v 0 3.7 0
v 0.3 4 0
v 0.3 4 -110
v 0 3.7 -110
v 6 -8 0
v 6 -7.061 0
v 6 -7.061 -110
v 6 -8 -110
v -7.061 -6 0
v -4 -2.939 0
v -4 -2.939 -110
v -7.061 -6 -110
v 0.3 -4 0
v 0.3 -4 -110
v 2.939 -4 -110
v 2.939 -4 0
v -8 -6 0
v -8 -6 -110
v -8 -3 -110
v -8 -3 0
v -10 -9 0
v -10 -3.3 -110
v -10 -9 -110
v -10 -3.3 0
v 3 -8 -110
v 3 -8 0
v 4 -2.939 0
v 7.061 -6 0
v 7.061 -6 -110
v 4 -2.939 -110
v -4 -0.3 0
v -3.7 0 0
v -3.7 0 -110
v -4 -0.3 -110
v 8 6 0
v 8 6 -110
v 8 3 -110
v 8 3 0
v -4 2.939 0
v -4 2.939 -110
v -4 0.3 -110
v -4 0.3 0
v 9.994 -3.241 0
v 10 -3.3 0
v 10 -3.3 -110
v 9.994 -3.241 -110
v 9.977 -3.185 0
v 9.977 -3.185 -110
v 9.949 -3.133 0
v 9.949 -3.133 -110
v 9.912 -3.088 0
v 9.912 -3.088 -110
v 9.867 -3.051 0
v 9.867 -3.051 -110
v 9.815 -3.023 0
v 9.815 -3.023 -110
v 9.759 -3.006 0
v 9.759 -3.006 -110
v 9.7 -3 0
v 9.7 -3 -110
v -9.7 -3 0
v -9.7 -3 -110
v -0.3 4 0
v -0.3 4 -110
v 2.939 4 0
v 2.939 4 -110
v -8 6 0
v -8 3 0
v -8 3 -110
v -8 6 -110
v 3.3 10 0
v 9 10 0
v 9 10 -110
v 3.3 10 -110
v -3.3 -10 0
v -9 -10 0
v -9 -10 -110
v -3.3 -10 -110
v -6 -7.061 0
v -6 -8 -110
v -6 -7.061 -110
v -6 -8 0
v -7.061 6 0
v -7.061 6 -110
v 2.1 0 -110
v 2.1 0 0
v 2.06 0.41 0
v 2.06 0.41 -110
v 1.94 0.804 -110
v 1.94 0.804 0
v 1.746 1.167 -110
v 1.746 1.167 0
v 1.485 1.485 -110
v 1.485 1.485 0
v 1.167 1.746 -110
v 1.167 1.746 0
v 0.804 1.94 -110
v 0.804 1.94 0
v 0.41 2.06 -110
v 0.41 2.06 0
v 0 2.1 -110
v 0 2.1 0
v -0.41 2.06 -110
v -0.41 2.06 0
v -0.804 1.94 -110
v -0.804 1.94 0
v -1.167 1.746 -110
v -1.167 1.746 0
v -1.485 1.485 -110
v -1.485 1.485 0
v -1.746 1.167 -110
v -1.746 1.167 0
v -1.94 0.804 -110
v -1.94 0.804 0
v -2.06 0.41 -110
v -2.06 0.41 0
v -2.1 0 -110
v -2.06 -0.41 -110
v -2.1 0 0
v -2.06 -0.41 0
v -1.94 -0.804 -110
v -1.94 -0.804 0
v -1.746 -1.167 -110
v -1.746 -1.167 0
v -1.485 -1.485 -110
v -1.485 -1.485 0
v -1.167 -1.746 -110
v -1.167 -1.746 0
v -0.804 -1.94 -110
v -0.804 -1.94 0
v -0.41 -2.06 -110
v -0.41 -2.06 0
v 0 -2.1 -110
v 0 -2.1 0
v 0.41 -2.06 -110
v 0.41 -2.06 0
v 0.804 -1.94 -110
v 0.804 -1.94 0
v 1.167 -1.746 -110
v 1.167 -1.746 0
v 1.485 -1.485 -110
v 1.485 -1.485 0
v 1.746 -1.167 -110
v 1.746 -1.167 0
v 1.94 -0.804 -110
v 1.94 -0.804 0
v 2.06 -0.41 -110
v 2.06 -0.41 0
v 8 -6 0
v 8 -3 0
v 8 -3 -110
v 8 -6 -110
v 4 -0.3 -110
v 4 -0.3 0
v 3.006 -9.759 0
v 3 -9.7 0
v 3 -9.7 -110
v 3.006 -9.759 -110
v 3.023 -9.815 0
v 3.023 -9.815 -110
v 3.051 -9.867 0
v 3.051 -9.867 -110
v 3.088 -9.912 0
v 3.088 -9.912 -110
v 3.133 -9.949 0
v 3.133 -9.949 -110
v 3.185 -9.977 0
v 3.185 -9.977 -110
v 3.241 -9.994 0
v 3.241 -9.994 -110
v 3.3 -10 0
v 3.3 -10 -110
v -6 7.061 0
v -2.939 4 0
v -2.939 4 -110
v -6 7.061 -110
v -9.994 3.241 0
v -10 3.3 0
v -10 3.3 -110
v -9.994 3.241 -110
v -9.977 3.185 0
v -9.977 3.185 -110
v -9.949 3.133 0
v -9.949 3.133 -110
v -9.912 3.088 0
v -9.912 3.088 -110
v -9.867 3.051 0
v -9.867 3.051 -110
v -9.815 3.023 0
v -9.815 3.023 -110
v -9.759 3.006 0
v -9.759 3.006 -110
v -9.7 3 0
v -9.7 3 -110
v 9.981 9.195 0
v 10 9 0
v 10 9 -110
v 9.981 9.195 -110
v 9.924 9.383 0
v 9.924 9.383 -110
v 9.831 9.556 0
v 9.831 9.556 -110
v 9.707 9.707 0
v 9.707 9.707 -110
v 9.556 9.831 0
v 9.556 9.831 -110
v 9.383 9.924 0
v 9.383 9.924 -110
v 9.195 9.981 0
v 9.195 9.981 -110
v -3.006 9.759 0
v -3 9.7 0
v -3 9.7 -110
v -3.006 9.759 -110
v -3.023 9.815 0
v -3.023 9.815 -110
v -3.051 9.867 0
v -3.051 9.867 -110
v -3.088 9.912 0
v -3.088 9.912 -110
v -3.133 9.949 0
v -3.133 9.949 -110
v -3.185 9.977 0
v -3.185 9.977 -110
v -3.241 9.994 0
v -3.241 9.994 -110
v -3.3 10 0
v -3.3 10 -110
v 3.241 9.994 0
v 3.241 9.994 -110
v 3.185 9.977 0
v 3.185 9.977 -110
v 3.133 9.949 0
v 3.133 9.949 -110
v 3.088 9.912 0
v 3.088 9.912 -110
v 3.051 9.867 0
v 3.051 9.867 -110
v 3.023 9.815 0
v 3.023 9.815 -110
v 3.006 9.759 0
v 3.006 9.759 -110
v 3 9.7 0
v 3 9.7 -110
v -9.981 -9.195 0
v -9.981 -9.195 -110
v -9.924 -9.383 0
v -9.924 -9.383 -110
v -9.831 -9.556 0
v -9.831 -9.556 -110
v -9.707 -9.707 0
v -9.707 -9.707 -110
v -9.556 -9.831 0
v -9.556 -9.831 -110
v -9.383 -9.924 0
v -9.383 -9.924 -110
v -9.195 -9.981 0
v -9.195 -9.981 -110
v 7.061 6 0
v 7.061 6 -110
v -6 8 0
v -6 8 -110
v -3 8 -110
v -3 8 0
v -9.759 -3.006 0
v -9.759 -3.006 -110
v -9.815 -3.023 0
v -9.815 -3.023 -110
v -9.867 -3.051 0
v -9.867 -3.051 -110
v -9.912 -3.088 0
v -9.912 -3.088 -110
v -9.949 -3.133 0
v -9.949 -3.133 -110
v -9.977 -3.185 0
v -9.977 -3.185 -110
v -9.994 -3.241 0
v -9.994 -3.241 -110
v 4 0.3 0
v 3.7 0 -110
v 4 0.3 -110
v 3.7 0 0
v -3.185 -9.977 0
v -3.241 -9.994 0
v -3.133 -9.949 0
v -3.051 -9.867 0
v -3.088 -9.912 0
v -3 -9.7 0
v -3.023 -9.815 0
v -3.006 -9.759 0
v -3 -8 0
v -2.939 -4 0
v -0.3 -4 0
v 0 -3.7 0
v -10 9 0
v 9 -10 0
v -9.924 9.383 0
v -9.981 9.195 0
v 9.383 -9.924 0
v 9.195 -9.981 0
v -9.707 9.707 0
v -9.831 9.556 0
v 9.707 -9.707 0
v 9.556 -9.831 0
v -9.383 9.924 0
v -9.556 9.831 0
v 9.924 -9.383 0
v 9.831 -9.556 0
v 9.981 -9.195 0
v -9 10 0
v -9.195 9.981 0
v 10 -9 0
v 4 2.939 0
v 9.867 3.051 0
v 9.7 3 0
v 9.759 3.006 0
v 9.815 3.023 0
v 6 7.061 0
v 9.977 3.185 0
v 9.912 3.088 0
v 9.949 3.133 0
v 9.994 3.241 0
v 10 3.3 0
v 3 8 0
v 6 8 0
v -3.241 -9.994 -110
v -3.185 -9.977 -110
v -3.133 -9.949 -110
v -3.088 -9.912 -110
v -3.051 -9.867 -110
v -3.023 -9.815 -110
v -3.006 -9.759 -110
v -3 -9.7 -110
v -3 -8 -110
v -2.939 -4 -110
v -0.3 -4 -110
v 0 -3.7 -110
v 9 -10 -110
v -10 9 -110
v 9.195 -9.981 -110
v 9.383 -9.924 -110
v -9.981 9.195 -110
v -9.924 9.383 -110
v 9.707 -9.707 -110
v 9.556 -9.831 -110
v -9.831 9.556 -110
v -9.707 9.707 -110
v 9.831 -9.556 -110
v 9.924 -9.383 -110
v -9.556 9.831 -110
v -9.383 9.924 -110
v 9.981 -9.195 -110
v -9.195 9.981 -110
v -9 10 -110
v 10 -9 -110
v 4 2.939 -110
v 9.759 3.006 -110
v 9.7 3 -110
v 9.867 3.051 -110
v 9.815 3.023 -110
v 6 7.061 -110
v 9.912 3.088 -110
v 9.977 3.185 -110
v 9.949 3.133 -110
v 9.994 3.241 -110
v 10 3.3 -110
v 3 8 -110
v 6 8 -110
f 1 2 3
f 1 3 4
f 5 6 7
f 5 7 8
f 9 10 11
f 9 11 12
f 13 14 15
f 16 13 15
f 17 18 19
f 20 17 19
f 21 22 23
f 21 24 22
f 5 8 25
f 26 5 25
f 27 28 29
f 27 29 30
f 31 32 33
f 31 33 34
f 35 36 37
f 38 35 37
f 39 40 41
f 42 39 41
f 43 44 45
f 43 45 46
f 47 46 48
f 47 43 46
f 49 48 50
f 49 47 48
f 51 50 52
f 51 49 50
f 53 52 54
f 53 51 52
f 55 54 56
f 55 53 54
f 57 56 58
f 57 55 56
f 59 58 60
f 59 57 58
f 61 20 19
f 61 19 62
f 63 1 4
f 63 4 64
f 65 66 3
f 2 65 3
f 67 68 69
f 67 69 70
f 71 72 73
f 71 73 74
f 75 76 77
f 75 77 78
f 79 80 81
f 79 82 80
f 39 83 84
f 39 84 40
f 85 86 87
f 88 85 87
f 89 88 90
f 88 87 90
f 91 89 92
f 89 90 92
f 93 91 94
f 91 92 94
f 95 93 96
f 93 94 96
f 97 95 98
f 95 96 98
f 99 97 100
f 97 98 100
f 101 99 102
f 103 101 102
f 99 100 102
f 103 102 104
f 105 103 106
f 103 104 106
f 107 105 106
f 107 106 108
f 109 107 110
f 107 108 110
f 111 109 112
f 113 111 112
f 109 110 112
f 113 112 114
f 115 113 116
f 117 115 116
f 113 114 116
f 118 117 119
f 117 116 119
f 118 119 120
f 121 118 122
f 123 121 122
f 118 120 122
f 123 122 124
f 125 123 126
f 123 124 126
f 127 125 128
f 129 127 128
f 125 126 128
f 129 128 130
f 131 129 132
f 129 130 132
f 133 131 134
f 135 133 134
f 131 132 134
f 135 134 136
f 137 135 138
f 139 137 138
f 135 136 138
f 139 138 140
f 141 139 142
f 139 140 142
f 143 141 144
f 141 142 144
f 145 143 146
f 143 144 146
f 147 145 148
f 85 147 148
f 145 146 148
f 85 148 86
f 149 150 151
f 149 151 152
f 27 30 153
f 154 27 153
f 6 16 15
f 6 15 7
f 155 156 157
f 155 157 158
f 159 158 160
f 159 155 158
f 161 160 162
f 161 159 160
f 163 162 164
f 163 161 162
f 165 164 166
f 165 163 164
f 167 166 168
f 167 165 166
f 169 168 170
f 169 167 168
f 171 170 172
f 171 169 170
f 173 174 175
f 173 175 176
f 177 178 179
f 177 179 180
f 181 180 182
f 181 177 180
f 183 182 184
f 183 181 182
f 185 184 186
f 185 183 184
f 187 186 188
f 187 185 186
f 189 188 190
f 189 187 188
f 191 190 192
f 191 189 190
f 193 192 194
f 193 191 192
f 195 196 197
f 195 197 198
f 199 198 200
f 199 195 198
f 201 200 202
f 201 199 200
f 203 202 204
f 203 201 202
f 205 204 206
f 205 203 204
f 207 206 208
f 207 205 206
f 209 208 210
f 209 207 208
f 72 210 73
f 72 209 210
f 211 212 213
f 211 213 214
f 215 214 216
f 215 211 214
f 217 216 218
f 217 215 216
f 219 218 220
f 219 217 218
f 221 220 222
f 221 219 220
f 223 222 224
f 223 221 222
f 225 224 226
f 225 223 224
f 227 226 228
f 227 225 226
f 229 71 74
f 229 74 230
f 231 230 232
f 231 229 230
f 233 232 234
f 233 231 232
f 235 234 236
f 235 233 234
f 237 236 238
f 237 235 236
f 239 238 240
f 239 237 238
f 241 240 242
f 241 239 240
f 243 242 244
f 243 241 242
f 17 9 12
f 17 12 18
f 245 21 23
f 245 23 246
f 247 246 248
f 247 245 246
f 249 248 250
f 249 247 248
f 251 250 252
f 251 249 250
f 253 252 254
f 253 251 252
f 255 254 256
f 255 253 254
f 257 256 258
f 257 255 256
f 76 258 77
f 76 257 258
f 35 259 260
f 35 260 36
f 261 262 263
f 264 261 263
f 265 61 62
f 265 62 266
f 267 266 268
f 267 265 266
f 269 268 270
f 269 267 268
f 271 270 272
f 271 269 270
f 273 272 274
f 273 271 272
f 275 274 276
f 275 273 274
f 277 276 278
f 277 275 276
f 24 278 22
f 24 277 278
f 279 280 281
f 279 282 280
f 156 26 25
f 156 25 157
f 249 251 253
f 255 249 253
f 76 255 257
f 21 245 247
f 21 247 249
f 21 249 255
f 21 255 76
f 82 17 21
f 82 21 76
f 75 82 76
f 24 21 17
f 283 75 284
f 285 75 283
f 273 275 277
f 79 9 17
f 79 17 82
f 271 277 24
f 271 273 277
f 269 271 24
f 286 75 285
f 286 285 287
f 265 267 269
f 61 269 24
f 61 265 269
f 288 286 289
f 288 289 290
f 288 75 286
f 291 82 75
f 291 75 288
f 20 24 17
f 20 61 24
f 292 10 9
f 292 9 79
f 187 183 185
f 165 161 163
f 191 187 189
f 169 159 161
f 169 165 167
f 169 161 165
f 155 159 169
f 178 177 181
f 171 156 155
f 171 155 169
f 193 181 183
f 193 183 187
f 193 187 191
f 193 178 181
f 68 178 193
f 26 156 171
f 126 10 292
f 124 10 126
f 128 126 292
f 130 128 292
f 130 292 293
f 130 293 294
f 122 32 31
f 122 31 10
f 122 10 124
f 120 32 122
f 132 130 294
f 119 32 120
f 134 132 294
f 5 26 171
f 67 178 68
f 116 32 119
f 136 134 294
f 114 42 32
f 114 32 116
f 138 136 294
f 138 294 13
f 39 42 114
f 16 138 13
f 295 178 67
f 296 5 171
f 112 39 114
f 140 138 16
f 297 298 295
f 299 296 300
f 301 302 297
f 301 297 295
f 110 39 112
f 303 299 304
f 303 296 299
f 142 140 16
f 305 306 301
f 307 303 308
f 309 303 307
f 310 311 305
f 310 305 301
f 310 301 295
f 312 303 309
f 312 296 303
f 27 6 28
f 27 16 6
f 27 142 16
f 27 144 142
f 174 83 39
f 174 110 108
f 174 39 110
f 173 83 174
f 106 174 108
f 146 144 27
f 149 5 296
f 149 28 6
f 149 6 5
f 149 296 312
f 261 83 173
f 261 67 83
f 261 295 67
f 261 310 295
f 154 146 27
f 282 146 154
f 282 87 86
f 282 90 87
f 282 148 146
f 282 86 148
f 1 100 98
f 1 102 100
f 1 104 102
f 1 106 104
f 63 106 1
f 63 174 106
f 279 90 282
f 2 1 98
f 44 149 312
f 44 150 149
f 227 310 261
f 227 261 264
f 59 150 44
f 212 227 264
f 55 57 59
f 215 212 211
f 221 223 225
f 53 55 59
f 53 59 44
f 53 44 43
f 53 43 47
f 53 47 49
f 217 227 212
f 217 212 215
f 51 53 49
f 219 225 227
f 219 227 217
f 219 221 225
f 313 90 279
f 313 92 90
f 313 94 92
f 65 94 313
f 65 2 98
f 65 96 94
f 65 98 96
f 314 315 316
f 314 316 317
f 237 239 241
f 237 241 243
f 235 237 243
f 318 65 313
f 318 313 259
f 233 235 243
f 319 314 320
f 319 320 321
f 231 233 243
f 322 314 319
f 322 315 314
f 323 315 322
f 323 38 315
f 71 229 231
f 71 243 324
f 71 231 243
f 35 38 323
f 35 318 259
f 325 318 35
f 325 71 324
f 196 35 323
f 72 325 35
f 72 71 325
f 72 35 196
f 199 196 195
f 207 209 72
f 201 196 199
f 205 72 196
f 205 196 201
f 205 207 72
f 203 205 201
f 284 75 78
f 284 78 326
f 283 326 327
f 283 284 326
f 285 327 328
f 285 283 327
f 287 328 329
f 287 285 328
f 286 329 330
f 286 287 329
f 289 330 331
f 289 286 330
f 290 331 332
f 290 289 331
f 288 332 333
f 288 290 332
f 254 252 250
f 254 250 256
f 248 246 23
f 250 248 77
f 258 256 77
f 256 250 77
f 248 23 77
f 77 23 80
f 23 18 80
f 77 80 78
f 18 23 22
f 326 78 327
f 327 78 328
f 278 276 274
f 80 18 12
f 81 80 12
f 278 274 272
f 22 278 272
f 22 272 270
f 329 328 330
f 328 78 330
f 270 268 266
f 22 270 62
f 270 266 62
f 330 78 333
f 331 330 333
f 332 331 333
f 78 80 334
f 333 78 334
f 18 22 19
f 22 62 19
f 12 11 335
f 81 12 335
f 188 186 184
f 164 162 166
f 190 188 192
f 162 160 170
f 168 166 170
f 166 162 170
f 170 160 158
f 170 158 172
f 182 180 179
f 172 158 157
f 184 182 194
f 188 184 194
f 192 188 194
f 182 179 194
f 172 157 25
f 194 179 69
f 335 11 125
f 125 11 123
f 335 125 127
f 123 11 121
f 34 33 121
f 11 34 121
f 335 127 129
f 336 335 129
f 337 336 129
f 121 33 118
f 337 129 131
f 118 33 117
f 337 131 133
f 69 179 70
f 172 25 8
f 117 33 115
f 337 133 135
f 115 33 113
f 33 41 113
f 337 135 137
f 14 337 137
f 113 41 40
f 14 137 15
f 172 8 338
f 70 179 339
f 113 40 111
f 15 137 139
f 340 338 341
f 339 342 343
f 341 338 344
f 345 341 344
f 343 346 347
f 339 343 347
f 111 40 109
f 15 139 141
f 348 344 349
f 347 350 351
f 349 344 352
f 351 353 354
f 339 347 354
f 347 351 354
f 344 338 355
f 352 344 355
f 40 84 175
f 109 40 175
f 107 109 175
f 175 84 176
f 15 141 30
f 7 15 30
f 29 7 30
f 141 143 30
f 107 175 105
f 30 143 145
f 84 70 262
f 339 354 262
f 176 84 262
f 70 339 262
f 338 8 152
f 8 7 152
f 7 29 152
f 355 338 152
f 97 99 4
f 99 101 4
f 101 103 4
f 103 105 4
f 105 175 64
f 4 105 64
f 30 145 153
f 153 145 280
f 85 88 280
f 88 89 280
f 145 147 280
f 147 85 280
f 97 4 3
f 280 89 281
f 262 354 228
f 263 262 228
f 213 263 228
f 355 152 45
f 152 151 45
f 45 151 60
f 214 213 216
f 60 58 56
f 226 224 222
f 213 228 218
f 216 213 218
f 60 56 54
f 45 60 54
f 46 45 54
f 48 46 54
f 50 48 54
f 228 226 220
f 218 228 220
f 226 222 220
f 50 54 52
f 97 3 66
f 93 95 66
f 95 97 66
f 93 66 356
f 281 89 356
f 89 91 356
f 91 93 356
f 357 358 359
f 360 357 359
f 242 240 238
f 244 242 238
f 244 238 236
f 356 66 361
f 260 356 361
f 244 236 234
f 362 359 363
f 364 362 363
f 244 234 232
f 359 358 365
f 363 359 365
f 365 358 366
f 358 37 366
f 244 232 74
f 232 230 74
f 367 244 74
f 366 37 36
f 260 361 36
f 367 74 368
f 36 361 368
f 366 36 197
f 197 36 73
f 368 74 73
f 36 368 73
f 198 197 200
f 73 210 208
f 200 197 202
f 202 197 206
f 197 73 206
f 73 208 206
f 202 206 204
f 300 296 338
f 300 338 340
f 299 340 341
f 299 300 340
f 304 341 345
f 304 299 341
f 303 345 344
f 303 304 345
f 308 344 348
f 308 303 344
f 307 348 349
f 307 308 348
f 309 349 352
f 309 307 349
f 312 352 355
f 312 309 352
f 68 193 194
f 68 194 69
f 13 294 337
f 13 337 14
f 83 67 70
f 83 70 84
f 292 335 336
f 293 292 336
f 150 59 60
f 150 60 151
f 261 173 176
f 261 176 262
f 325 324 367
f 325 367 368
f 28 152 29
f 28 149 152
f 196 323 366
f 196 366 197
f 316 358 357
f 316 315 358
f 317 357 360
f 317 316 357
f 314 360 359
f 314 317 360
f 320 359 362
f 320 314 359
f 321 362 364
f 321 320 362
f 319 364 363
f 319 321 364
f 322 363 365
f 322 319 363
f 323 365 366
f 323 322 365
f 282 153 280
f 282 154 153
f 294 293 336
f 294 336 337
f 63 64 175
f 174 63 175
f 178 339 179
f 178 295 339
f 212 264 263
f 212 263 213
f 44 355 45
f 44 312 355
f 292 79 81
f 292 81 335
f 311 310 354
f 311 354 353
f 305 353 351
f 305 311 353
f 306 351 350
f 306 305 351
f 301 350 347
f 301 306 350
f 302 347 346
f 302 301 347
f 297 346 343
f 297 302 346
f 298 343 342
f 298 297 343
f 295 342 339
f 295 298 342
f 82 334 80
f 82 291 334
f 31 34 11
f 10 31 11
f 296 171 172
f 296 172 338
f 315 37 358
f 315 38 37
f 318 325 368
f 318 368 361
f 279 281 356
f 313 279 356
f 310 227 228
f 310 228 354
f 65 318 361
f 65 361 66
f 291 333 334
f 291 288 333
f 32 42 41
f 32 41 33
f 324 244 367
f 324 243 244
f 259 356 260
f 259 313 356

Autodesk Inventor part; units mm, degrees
sketch "Sketch_5" plane through (0, 0, 0) normal (0, 0, 1) x (1, 0, 0)
  arc A0 (-10, 3.3) -> (-9.7, 3) centre (-9.7, 3.3) ccw
  line L0 (-9.7, 3) -> (-8, 3)
  line L1 (-8, 3) -> (-8, 6)
  line L2 (-8, 6) -> (-7.0607, 6)
  line L3 (-7.0607, 6) -> (-4, 2.9393)
  line L4 (-4, 2.9393) -> (-4, 0.3)
  line L5 (-4, 0.3) -> (-3.7, 0)
  line L6 (-3.7, 0) -> (-4, -0.3)
  line L7 (-4, -0.3) -> (-4, -2.9393)
  line L8 (-4, -2.9393) -> (-7.0607, -6)
  line L9 (-7.0607, -6) -> (-8, -6)
  line L10 (-8, -6) -> (-8, -3)
  line L11 (-8, -3) -> (-9.7, -3)
  arc A1 (-9.7, -3) -> (-10, -3.3) centre (-9.7, -3.3) ccw
  line L12 (-10, -3.3) -> (-10, -9)
  arc A2 (-10, -9) -> (-9, -10) centre (-9, -9) ccw
  line L13 (-9, -10) -> (-3.3, -10)
  arc A3 (-3.3, -10) -> (-3, -9.7) centre (-3.3, -9.7) ccw
  line L14 (-3, -9.7) -> (-3, -8)
  line L15 (-3, -8) -> (-6, -8)
  line L16 (-6, -8) -> (-6, -7.0607)
  line L17 (-6, -7.0607) -> (-2.9393, -4)
  line L18 (-2.9393, -4) -> (-0.3, -4)
  line L19 (-0.3, -4) -> (0, -3.7)
  line L20 (0, -3.7) -> (0.3, -4)
  line L21 (0.3, -4) -> (2.9393, -4)
  line L22 (2.9393, -4) -> (6, -7.0607)
  line L23 (6, -7.0607) -> (6, -8)
  line L24 (6, -8) -> (3, -8)
  line L25 (3, -8) -> (3, -9.7)
  arc A4 (3, -9.7) -> (3.3, -10) centre (3.3, -9.7) ccw
  line L26 (3.3, -10) -> (9, -10)
  arc A5 (9, -10) -> (10, -9) centre (9, -9) ccw
  line L27 (10, -9) -> (10, -3.3)
  arc A6 (10, -3.3) -> (9.7, -3) centre (9.7, -3.3) ccw
  line L28 (9.7, -3) -> (8, -3)
  line L29 (8, -3) -> (8, -6)
  line L30 (8, -6) -> (7.0607, -6)
  line L31 (7.0607, -6) -> (4, -2.9393)
  line L32 (4, -2.9393) -> (4, -0.3)
  line L33 (4, -0.3) -> (3.7, 0)
  line L34 (3.7, 0) -> (4, 0.3)
  line L35 (4, 0.3) -> (4, 2.9393)
  line L36 (4, 2.9393) -> (7.0607, 6)
  line L37 (7.0607, 6) -> (8, 6)
  line L38 (8, 6) -> (8, 3)
  line L39 (8, 3) -> (9.7, 3)
  arc A7 (9.7, 3) -> (10, 3.3) centre (9.7, 3.3) ccw
  line L40 (10, 3.3) -> (10, 9)
  arc A8 (10, 9) -> (9, 10) centre (9, 9) ccw
  line L41 (9, 10) -> (3.3, 10)
  arc A9 (3.3, 10) -> (3, 9.7) centre (3.3, 9.7) ccw
  line L42 (3, 9.7) -> (3, 8)
  line L43 (3, 8) -> (6, 8)
  line L44 (6, 8) -> (6, 7.0607)
  line L45 (6, 7.0607) -> (2.9393, 4)
  line L46 (2.9393, 4) -> (0.3, 4)
  line L47 (0.3, 4) -> (0, 3.7)
  line L48 (0, 3.7) -> (-0.3, 4)
  line L49 (-0.3, 4) -> (-2.9393, 4)
  line L50 (-2.9393, 4) -> (-6, 7.0607)
  line L51 (-6, 7.0607) -> (-6, 8)
  line L52 (-6, 8) -> (-3, 8)
  line L53 (-3, 8) -> (-3, 9.7)
  arc A10 (-3, 9.7) -> (-3.3, 10) centre (-3.3, 9.7) ccw
  line L54 (-3.3, 10) -> (-9, 10)
  arc A11 (-9, 10) -> (-10, 9) centre (-9, 9) ccw
  line L55 (-10, 9) -> (-10, 3.3)
  circle A12 centre (0, 0) radius 2.1
extrude "Extrusion1" add sketch "Sketch_5" against normal blind 110
ref_plane "to_frame_XY" through (0, 0, 0) normal (0, 0, 1) x (1, 0, 0)
ref_plane "to_frame_YZ" through (0, 0, 0) normal (1, 0, 0) x (0, 1, 0)
ref_plane "to_frame_ZX" through (0, 0, 0) normal (0, 1, 0) x (0, 0, 1)
properties part number "프로파일_110" material "알루미늄 6061"
